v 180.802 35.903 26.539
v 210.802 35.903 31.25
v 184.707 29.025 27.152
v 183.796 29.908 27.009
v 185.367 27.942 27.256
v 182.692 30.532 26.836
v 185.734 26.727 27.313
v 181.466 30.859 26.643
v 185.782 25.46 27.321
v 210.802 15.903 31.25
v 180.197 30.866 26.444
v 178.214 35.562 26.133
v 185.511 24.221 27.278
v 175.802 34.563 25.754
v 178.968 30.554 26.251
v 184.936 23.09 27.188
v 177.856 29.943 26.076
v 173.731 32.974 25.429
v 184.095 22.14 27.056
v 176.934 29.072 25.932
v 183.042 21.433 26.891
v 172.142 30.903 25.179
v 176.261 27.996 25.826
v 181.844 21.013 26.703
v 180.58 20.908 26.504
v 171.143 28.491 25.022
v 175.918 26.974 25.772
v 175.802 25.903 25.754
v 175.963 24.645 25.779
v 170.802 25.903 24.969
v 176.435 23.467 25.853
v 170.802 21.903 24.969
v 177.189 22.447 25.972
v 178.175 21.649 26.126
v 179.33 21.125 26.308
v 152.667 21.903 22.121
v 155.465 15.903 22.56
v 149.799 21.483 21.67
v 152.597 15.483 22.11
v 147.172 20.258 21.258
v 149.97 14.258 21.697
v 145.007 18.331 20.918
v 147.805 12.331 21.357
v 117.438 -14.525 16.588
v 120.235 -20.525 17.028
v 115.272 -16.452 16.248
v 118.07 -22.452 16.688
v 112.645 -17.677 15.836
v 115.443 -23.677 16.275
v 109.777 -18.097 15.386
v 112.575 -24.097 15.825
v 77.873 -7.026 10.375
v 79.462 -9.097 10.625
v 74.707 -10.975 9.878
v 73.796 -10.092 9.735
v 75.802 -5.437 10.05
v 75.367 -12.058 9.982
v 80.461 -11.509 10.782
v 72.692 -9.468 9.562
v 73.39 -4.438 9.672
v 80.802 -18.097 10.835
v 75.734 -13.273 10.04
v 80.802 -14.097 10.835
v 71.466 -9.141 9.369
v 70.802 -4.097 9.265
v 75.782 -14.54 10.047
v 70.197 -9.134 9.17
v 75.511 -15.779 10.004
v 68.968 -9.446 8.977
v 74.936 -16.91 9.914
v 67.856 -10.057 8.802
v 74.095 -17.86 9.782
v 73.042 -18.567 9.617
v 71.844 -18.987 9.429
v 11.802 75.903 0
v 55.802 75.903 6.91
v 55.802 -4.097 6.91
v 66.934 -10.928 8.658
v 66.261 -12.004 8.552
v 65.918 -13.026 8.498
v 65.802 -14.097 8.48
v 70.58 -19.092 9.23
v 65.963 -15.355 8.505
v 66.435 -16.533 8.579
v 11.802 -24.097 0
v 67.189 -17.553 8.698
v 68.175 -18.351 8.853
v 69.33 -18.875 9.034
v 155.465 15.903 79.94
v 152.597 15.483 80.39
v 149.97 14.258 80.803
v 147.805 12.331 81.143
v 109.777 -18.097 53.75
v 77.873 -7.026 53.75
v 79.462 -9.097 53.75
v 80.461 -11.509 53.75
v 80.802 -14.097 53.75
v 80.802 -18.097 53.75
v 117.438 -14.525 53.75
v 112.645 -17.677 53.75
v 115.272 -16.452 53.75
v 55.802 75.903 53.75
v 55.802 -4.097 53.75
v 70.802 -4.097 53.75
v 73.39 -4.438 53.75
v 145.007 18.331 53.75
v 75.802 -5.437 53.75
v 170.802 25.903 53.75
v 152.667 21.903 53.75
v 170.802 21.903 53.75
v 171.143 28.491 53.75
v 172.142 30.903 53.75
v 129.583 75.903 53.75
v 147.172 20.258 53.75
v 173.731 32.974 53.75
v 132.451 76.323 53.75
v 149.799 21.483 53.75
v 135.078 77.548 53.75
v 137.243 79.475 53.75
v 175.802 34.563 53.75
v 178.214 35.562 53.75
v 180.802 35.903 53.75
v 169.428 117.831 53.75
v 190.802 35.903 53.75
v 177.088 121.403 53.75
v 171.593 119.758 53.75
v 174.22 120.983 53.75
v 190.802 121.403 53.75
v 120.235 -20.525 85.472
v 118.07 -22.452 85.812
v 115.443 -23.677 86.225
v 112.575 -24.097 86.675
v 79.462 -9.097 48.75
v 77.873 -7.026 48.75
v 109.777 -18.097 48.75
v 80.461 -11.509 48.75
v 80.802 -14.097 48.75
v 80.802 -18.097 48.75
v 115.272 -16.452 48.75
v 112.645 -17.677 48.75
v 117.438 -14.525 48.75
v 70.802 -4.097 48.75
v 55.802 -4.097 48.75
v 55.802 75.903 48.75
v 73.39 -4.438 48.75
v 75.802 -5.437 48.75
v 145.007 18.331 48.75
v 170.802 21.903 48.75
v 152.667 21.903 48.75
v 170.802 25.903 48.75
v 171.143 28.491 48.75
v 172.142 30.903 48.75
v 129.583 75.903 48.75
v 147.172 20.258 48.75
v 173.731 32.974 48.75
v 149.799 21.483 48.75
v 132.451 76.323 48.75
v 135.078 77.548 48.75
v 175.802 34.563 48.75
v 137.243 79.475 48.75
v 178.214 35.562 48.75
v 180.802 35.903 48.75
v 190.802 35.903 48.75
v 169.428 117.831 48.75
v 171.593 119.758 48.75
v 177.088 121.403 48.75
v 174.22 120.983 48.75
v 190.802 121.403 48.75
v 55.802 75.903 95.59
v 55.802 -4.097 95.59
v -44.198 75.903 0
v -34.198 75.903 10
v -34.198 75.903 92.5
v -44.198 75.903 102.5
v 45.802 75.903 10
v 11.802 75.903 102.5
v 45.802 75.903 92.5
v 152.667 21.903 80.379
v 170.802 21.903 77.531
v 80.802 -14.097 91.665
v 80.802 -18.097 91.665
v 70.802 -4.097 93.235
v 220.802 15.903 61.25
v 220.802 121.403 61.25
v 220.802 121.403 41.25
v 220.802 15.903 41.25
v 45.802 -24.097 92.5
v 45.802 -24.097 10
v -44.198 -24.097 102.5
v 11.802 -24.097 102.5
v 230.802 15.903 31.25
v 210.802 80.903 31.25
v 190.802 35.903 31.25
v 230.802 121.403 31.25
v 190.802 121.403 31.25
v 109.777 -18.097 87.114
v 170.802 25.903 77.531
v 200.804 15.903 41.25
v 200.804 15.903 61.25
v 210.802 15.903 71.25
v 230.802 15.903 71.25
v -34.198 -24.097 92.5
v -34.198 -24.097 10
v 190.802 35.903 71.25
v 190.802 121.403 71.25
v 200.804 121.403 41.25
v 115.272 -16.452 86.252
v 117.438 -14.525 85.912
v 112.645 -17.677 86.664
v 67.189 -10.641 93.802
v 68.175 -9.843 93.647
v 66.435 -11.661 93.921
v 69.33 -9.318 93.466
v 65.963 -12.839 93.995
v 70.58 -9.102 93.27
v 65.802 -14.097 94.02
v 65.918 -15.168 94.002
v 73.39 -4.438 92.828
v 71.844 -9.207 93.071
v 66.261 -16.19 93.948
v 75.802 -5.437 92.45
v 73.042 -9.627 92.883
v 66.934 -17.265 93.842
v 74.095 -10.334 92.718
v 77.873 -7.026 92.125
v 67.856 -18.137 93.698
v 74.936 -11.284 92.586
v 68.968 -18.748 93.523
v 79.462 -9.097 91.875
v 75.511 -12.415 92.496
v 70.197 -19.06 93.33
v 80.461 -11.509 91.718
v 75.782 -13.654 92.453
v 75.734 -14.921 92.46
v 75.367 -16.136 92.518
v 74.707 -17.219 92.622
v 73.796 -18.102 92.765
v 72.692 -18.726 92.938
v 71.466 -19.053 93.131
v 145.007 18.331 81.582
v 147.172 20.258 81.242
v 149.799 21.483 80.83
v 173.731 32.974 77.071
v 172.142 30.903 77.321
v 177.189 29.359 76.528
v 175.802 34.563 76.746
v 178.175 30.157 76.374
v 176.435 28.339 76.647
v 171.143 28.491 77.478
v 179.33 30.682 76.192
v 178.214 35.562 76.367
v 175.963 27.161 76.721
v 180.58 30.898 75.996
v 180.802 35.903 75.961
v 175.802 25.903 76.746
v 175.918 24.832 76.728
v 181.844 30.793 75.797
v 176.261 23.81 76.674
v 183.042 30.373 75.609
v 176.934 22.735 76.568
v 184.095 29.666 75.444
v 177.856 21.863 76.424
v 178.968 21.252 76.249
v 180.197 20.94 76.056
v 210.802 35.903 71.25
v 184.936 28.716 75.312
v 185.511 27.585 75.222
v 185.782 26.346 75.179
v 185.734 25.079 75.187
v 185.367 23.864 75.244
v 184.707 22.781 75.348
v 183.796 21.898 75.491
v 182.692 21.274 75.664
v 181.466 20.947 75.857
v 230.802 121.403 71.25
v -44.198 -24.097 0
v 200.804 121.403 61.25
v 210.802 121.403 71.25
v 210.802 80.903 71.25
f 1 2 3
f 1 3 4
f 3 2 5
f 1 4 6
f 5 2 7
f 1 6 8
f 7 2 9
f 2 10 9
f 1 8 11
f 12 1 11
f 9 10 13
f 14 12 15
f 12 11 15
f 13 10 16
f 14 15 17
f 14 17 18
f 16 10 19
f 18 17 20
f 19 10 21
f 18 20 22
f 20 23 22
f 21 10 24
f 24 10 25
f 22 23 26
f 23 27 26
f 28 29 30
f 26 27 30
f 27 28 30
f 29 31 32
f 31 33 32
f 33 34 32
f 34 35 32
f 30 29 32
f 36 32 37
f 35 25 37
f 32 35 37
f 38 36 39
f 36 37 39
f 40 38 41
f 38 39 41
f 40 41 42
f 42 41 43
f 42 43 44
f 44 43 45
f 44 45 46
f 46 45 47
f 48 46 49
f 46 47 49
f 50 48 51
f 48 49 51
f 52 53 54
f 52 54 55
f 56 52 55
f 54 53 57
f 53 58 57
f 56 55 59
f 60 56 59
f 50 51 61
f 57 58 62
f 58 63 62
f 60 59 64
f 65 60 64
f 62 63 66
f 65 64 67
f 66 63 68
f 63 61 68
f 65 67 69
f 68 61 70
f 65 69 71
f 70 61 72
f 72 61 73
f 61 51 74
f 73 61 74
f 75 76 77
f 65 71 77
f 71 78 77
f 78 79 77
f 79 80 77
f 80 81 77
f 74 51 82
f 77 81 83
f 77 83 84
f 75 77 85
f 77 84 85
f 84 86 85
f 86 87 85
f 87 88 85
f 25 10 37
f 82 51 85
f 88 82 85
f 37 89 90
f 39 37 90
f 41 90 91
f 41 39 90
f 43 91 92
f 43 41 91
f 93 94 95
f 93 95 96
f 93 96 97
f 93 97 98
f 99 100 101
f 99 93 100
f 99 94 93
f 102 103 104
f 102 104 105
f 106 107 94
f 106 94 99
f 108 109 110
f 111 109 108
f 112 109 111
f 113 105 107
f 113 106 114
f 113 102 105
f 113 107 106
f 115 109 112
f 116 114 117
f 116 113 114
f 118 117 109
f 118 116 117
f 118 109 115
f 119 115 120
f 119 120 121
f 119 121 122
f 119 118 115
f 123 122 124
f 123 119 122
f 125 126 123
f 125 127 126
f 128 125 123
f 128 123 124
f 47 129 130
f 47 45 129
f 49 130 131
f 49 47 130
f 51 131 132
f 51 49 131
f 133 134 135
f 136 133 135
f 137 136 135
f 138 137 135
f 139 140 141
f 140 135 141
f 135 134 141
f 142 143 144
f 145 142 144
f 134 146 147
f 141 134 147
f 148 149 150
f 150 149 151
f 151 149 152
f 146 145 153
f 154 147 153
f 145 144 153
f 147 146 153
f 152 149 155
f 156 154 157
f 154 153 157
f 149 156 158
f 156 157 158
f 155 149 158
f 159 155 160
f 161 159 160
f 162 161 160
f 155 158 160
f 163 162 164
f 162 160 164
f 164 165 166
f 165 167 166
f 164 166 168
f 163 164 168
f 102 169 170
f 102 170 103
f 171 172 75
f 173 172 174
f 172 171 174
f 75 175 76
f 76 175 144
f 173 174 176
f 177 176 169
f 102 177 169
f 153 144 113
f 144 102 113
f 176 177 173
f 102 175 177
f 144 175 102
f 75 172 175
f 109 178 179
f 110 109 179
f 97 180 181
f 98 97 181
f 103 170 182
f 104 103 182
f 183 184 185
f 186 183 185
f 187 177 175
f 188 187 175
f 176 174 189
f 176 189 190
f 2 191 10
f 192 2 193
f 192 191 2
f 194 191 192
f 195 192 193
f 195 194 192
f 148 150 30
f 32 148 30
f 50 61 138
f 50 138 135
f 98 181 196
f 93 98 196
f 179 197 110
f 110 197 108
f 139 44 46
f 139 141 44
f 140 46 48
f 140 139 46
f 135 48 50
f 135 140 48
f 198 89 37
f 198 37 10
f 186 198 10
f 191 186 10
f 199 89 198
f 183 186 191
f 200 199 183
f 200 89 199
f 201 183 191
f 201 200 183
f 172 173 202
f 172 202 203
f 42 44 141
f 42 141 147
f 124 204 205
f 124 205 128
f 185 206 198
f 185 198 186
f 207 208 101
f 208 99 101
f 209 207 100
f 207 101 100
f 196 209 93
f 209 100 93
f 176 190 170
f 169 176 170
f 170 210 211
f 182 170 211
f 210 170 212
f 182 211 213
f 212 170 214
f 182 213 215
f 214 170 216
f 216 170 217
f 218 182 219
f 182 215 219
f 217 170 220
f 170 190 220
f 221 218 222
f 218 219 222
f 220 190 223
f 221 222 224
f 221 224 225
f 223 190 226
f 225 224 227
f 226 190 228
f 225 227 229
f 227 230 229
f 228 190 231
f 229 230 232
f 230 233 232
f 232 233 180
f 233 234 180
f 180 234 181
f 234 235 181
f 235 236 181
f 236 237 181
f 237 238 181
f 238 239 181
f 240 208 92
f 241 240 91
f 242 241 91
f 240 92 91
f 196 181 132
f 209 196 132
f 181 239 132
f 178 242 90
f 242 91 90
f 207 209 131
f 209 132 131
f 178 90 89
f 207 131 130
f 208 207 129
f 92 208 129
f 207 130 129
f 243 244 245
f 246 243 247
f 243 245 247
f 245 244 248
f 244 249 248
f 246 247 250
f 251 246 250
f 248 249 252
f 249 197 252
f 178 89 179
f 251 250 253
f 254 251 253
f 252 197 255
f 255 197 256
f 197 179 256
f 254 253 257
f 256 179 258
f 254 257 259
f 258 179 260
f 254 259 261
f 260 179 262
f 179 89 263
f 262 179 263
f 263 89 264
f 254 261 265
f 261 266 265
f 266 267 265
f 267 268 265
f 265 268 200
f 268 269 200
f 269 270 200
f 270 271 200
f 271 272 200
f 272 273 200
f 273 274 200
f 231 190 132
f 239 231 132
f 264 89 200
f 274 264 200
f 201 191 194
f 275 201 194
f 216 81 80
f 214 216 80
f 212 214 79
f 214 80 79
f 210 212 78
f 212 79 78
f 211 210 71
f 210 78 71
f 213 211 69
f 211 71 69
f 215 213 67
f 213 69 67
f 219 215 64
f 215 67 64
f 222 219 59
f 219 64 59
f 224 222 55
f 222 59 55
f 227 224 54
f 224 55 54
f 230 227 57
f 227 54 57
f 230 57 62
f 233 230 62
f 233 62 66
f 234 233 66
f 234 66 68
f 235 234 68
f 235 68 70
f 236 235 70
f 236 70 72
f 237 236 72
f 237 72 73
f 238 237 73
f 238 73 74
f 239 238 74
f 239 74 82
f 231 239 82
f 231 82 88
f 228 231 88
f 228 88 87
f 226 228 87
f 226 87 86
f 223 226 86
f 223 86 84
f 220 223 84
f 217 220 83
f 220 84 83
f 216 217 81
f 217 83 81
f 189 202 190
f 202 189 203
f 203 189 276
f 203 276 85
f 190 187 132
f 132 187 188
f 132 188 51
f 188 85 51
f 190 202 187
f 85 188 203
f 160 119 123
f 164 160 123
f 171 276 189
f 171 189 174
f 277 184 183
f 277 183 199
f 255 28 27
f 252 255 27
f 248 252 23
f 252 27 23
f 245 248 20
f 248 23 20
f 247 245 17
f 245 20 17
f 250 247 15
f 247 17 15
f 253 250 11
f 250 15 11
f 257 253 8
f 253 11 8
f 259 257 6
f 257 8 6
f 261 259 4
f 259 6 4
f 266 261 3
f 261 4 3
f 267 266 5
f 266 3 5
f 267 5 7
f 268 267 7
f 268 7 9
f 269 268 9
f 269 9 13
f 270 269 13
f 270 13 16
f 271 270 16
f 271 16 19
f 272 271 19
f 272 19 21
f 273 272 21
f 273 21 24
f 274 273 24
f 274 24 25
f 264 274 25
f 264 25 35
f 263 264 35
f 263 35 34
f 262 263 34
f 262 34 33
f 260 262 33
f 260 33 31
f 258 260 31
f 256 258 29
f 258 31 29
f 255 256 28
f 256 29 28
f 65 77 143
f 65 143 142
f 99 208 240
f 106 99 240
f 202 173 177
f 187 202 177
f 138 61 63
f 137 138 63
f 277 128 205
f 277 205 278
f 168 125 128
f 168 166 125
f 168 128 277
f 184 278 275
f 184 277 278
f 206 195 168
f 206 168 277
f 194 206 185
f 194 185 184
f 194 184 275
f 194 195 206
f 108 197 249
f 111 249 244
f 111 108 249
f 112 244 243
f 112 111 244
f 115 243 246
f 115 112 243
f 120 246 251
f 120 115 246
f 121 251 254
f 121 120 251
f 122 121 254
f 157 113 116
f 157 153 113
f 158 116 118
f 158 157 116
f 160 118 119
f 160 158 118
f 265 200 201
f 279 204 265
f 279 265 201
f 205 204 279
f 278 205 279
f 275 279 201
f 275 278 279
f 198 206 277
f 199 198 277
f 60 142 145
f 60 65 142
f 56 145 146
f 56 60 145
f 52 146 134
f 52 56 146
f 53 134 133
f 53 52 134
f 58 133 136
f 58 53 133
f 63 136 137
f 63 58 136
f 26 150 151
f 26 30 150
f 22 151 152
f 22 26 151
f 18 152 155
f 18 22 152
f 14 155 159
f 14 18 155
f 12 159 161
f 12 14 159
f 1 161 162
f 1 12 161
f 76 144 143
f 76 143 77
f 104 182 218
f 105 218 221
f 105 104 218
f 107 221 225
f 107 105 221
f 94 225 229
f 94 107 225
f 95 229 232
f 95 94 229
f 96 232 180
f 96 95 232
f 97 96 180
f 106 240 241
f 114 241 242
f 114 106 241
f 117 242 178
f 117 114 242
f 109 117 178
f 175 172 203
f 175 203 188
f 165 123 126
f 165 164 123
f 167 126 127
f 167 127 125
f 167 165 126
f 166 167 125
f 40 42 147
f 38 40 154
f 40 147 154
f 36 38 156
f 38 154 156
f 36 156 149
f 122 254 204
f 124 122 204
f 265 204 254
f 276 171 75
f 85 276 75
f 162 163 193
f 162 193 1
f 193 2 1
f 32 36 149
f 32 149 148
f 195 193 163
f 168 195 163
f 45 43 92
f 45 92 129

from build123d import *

# Parameters (mm, degrees)
SKETCH1_W           = 275
SKETCH1_H           = 145.5
BOSS_EXTRUDE1_DEPTH = 102.5
SKETCH3_W           = 115
SKETCH3_H           = 45.5
SKETCH3_W_2         = 80
SKETCH3_H_2         = 40
CUT_EXTRUDE1_DEPTH  = 102.5
SKETCH4_W           = 80
SKETCH4_H           = 82.5
CUT_EXTRUDE3_DEPTH  = 100
CUT_EXTRUDE4_DEPTH  = 105.5
SKETCH7_W           = 20
SKETCH7_H           = 31.25
SKETCH7_H_2         = 31.588652779
CUT_EXTRUDE5_DEPTH  = 105.5
CUT_EXTRUDE7_DEPTH  = 85.5
SKETCH10_W          = 100
SKETCH10_H          = 48.75
CUT_EXTRUDE8_DEPTH  = 14
SKETCH11_W          = 100
SKETCH11_H          = 48.75
CUT_EXTRUDE9_DEPTH  = 14
SKETCH12_W          = 10
SKETCH12_H          = 48.75
CUT_EXTRUDE10_DEPTH = 26
SKETCH13_W          = 10
SKETCH13_H          = 48.75
CUT_EXTRUDE12_DEPTH = 26
SKETCH14_W          = 15
SKETCH14_H          = 48.75
CUT_EXTRUDE13_DEPTH = 80
CUT_EXTRUDE14_DEPTH = 102.5
CUT_EXTRUDE15_DEPTH = 48.75
CUT_EXTRUDE16_DEPTH = 48.75
CUT_EXTRUDE17_DEPTH = 5
CUT_EXTRUDE18_DEPTH = 105
SKETCH24_R          = 5
CUT_EXTRUDE19_DEPTH = 105
CUT_EXTRUDE20_DEPTH = 105
FILLET1_R           = 10
FILLET2_R           = 10
FILLET3_R           = 10
FILLET4_R           = 10
FILLET5_R           = 10
FILLET6_R           = 10
FILLET7_R           = 10
FILLET8_R           = 10
FILLET9_R           = 10
FILLET10_R          = 10
FILLET11_R          = 10
FILLET12_R          = 10


with BuildPart() as part:
    # Sketch1 → Boss-Extrude1 (new body)
    with BuildSketch(Plane.XY):
        with Locations((93.302092116, 48.653058441)):
            Rectangle(SKETCH1_W, SKETCH1_H)
    extrude(amount=BOSS_EXTRUDE1_DEPTH)

    # Sketch3 → Cut-Extrude1 (cut)
    with BuildSketch(Plane.XY.offset(102.5)):
        with Locations((13.302092116, 98.653058441)):
            Rectangle(SKETCH3_W, SKETCH3_H)
        with Locations((190.802092116, -4.096941559)):
            Rectangle(SKETCH3_W_2, SKETCH3_H_2)
    extrude(amount=-CUT_EXTRUDE1_DEPTH, mode=Mode.SUBTRACT)

    # Sketch4 → Cut-Extrude3 (cut)
    with BuildSketch(Plane(origin=(0, 75.903058441, 0), x_dir=(1, 0, 0), z_dir=(0, 1, 0))):
        with Locations((5.802092116, -51.25)):
            Rectangle(SKETCH4_W, SKETCH4_H)
    extrude(amount=-CUT_EXTRUDE3_DEPTH, mode=Mode.SUBTRACT)

    # Sketch6 → Cut-Extrude4 (cut)
    with BuildSketch(Plane(origin=(0, 121.403058441, 0), x_dir=(1, 0, 0), z_dir=(0, 1, 0))):
        Polygon((200.803509438, -51.25), (200.803509438, -41.25), (220.802092116, -41.25), (220.802092116, -51.25), (220.802092116, -61.25), (200.803509438, -61.25), align=None)
    extrude(amount=-CUT_EXTRUDE4_DEPTH, mode=Mode.SUBTRACT)

    # Sketch7 → Cut-Extrude5 (cut)
    with BuildSketch(Plane(origin=(0, 121.403058441, 0), x_dir=(1, 0, 0), z_dir=(0, 1, 0))):
        with Locations((220.802092116, -15.625)):
            Rectangle(SKETCH7_W, SKETCH7_H)
        with Locations((220.802092116, -87.04432639)):
            Rectangle(SKETCH7_W, SKETCH7_H_2)
    extrude(amount=-CUT_EXTRUDE5_DEPTH, mode=Mode.SUBTRACT)

    # Sketch8 → Cut-Extrude7 (cut)
    with BuildSketch(Plane(origin=(0, 121.403058441, 0), x_dir=(1, 0, 0), z_dir=(0, 1, 0))):
        Polygon((190.802092116, -31.25), (190.802092116, -48.75), (70.802092116, -48.75), (70.802092116, 0), (210.802092116, 0), (210.802092116, -31.25), align=None)
        Polygon((190.802092116, -71.25), (190.802092116, -53.75), (70.802092116, -53.75), (70.802092116, -102.5), (210.802092116, -102.5), (210.802092116, -71.25), align=None)
    extrude(amount=-CUT_EXTRUDE7_DEPTH, mode=Mode.SUBTRACT)

    # Sketch10 → Cut-Extrude8 (cut)
    with BuildSketch(Plane(origin=(0, 35.903058441, 0), x_dir=(1, 0, 0), z_dir=(0, 1, 0))):
        with Locations((120.802092116, -78.125)):
            Rectangle(SKETCH10_W, SKETCH10_H)
    extrude(amount=-CUT_EXTRUDE8_DEPTH, mode=Mode.SUBTRACT)

    # Sketch11 → Cut-Extrude9 (cut)
    with BuildSketch(Plane(origin=(0, 35.903058441, 0), x_dir=(1, 0, 0), z_dir=(0, 1, 0))):
        with Locations((120.802092116, -24.375)):
            Rectangle(SKETCH11_W, SKETCH11_H)
    extrude(amount=-CUT_EXTRUDE9_DEPTH, mode=Mode.SUBTRACT)

    # Sketch12 → Cut-Extrude10 (cut)
    with BuildSketch(Plane(origin=(0, 21.903058441, 0), x_dir=(1, 0, 0), z_dir=(0, 1, 0))):
        with Locations((75.802092116, -78.125)):
            Rectangle(SKETCH12_W, SKETCH12_H)
    extrude(amount=-CUT_EXTRUDE10_DEPTH, mode=Mode.SUBTRACT)

    # Sketch13 → Cut-Extrude12 (cut)
    with BuildSketch(Plane(origin=(0, 21.903058441, 0), x_dir=(1, 0, 0), z_dir=(0, 1, 0))):
        with Locations((75.802092116, -24.375)):
            Rectangle(SKETCH13_W, SKETCH13_H)
    extrude(amount=-CUT_EXTRUDE12_DEPTH, mode=Mode.SUBTRACT)

    # Sketch14 → Cut-Extrude13 (cut)
    with BuildSketch(Plane(origin=(0, 75.903058441, 0), x_dir=(1, 0, 0), z_dir=(0, 1, 0))):
        with Locations((63.302092116, -78.125)):
            Rectangle(SKETCH14_W, SKETCH14_H)
        with Locations((63.302092116, -24.375)):
            Rectangle(SKETCH14_W, SKETCH14_H)
    extrude(amount=-CUT_EXTRUDE13_DEPTH, mode=Mode.SUBTRACT)

    # Sketch16 → Cut-Extrude14 (cut)
    with BuildSketch(Plane.XY.offset(102.5)):
        Polygon((150.802092116, 15.903058441), (117.238106869, -24.096941559), (150.802092116, -24.096941559), align=None)
    extrude(amount=-CUT_EXTRUDE14_DEPTH, mode=Mode.SUBTRACT)

    # Sketch17 → Cut-Extrude15 (cut)
    with BuildSketch(Plane.XY.offset(102.5)):
        Polygon((80.802092116, -4.096941559), (80.802092116, -18.096941559), (114.44026092, -18.096941559), (148.004246167, 21.903058441), (80.802092116, 21.903058441), align=None)
    extrude(amount=-CUT_EXTRUDE15_DEPTH, mode=Mode.SUBTRACT)

    # Sketch18 → Cut-Extrude16 (cut)
    with BuildSketch(Plane(origin=(0, 0, 0), x_dir=(-1, 0, 0), z_dir=(0, 0, -1))):
        Polygon((-80.802092116, -4.096941559), (-80.802092116, -18.096941559), (-114.44026092, -18.096941559), (-148.004246167, 21.903058441), (-80.802092116, 21.903058441), align=None)
    extrude(amount=-CUT_EXTRUDE16_DEPTH, mode=Mode.SUBTRACT)

    # Sketch19 → Cut-Extrude17 (cut)
    with BuildSketch(Plane.XY.offset(53.75)):
        Polygon((70.802092116, 75.903058441), (134.245946408, 75.903058441), (172.424979627, 121.403058441), (70.802092116, 121.403058441), align=None)
    extrude(amount=-CUT_EXTRUDE17_DEPTH, mode=Mode.SUBTRACT)

    # Sketch23 → Cut-Extrude18 (cut)
    with BuildSketch(Plane.XZ.offset(24.096941559)):
        Polygon((11.802092116, 102.5), (210.802092116, 71.25), (210.802092116, 102.5), align=None)
    extrude(amount=-CUT_EXTRUDE18_DEPTH, mode=Mode.SUBTRACT)

    # Sketch24 → Cut-Extrude19 (cut)
    with BuildSketch(Plane(origin=(0, 0, 0), x_dir=(-1, 0, 0), z_dir=(0, 0, -1))):
        with Locations((-180.802092116, 25.903058441)):
            Circle(SKETCH24_R)
        with Locations((-70.802092116, -14.096941559)):
            Circle(SKETCH24_R)
    extrude(amount=-CUT_EXTRUDE19_DEPTH, mode=Mode.SUBTRACT)

    # Sketch25 → Cut-Extrude20 (cut)
    with BuildSketch(Plane.XZ.offset(24.096941559)):
        Polygon((11.802092116, 0), (210.802092116, 0), (210.802092116, 31.25), align=None)
    extrude(amount=-CUT_EXTRUDE20_DEPTH, mode=Mode.SUBTRACT)

    # Fillet1
    fillet1_edges = [part.edges().sort_by_distance(p)[0] for p in [
        (80.802092116, -4.096941559, 72.707286432),
    ]]
    fillet(fillet1_edges, radius=FILLET1_R)

    # Fillet2
    fillet2_edges = [part.edges().sort_by_distance(p)[0] for p in [
        (148.004246167, 21.903058441, 67.430735392),
    ]]
    fillet(fillet2_edges, radius=FILLET2_R)

    # Fillet3
    fillet3_edges = [part.edges().sort_by_distance(p)[0] for p in [
        (170.802092116, 35.903058441, 65.640703518),
    ]]
    fillet(fillet3_edges, radius=FILLET3_R)

    # Fillet4
    fillet4_edges = [part.edges().sort_by_distance(p)[0] for p in [
        (80.802092116, -4.096941559, 29.792713568),
    ]]
    fillet(fillet4_edges, radius=FILLET4_R)

    # Fillet5
    fillet5_edges = [part.edges().sort_by_distance(p)[0] for p in [
        (148.004246167, 21.903058441, 35.069264608),
    ]]
    fillet(fillet5_edges, radius=FILLET5_R)

    # Fillet6
    fillet6_edges = [part.edges().sort_by_distance(p)[0] for p in [
        (170.802092116, 35.903058441, 36.859296482),
    ]]
    fillet(fillet6_edges, radius=FILLET6_R)

    # Fillet7
    fillet7_edges = [part.edges().sort_by_distance(p)[0] for p in [
        (114.44026092, -18.096941559, 32.433901445),
    ]]
    fillet(fillet7_edges, radius=FILLET7_R)

    # Fillet8
    fillet8_edges = [part.edges().sort_by_distance(p)[0] for p in [
        (114.44026092, -18.096941559, 70.066098555),
    ]]
    fillet(fillet8_edges, radius=FILLET8_R)

    # Fillet9
    fillet9_edges = [part.edges().sort_by_distance(p)[0] for p in [
        (134.245946408, 75.903058441, 51.25),
    ]]
    fillet(fillet9_edges, radius=FILLET9_R)

    # Fillet10
    fillet10_edges = [part.edges().sort_by_distance(p)[0] for p in [
        (172.424979627, 121.403058441, 51.25),
    ]]
    fillet(fillet10_edges, radius=FILLET10_R)

    # Fillet11
    fillet11_edges = [part.edges().sort_by_distance(p)[0] for p in [
        (150.802092116, 15.903058441, 51.25),
    ]]
    fillet(fillet11_edges, radius=FILLET11_R)

    # Fillet12
    fillet12_edges = [part.edges().sort_by_distance(p)[0] for p in [
        (117.238106869, -24.096941559, 51.25),
    ]]
    fillet(fillet12_edges, radius=FILLET12_R)


solid = part.part
